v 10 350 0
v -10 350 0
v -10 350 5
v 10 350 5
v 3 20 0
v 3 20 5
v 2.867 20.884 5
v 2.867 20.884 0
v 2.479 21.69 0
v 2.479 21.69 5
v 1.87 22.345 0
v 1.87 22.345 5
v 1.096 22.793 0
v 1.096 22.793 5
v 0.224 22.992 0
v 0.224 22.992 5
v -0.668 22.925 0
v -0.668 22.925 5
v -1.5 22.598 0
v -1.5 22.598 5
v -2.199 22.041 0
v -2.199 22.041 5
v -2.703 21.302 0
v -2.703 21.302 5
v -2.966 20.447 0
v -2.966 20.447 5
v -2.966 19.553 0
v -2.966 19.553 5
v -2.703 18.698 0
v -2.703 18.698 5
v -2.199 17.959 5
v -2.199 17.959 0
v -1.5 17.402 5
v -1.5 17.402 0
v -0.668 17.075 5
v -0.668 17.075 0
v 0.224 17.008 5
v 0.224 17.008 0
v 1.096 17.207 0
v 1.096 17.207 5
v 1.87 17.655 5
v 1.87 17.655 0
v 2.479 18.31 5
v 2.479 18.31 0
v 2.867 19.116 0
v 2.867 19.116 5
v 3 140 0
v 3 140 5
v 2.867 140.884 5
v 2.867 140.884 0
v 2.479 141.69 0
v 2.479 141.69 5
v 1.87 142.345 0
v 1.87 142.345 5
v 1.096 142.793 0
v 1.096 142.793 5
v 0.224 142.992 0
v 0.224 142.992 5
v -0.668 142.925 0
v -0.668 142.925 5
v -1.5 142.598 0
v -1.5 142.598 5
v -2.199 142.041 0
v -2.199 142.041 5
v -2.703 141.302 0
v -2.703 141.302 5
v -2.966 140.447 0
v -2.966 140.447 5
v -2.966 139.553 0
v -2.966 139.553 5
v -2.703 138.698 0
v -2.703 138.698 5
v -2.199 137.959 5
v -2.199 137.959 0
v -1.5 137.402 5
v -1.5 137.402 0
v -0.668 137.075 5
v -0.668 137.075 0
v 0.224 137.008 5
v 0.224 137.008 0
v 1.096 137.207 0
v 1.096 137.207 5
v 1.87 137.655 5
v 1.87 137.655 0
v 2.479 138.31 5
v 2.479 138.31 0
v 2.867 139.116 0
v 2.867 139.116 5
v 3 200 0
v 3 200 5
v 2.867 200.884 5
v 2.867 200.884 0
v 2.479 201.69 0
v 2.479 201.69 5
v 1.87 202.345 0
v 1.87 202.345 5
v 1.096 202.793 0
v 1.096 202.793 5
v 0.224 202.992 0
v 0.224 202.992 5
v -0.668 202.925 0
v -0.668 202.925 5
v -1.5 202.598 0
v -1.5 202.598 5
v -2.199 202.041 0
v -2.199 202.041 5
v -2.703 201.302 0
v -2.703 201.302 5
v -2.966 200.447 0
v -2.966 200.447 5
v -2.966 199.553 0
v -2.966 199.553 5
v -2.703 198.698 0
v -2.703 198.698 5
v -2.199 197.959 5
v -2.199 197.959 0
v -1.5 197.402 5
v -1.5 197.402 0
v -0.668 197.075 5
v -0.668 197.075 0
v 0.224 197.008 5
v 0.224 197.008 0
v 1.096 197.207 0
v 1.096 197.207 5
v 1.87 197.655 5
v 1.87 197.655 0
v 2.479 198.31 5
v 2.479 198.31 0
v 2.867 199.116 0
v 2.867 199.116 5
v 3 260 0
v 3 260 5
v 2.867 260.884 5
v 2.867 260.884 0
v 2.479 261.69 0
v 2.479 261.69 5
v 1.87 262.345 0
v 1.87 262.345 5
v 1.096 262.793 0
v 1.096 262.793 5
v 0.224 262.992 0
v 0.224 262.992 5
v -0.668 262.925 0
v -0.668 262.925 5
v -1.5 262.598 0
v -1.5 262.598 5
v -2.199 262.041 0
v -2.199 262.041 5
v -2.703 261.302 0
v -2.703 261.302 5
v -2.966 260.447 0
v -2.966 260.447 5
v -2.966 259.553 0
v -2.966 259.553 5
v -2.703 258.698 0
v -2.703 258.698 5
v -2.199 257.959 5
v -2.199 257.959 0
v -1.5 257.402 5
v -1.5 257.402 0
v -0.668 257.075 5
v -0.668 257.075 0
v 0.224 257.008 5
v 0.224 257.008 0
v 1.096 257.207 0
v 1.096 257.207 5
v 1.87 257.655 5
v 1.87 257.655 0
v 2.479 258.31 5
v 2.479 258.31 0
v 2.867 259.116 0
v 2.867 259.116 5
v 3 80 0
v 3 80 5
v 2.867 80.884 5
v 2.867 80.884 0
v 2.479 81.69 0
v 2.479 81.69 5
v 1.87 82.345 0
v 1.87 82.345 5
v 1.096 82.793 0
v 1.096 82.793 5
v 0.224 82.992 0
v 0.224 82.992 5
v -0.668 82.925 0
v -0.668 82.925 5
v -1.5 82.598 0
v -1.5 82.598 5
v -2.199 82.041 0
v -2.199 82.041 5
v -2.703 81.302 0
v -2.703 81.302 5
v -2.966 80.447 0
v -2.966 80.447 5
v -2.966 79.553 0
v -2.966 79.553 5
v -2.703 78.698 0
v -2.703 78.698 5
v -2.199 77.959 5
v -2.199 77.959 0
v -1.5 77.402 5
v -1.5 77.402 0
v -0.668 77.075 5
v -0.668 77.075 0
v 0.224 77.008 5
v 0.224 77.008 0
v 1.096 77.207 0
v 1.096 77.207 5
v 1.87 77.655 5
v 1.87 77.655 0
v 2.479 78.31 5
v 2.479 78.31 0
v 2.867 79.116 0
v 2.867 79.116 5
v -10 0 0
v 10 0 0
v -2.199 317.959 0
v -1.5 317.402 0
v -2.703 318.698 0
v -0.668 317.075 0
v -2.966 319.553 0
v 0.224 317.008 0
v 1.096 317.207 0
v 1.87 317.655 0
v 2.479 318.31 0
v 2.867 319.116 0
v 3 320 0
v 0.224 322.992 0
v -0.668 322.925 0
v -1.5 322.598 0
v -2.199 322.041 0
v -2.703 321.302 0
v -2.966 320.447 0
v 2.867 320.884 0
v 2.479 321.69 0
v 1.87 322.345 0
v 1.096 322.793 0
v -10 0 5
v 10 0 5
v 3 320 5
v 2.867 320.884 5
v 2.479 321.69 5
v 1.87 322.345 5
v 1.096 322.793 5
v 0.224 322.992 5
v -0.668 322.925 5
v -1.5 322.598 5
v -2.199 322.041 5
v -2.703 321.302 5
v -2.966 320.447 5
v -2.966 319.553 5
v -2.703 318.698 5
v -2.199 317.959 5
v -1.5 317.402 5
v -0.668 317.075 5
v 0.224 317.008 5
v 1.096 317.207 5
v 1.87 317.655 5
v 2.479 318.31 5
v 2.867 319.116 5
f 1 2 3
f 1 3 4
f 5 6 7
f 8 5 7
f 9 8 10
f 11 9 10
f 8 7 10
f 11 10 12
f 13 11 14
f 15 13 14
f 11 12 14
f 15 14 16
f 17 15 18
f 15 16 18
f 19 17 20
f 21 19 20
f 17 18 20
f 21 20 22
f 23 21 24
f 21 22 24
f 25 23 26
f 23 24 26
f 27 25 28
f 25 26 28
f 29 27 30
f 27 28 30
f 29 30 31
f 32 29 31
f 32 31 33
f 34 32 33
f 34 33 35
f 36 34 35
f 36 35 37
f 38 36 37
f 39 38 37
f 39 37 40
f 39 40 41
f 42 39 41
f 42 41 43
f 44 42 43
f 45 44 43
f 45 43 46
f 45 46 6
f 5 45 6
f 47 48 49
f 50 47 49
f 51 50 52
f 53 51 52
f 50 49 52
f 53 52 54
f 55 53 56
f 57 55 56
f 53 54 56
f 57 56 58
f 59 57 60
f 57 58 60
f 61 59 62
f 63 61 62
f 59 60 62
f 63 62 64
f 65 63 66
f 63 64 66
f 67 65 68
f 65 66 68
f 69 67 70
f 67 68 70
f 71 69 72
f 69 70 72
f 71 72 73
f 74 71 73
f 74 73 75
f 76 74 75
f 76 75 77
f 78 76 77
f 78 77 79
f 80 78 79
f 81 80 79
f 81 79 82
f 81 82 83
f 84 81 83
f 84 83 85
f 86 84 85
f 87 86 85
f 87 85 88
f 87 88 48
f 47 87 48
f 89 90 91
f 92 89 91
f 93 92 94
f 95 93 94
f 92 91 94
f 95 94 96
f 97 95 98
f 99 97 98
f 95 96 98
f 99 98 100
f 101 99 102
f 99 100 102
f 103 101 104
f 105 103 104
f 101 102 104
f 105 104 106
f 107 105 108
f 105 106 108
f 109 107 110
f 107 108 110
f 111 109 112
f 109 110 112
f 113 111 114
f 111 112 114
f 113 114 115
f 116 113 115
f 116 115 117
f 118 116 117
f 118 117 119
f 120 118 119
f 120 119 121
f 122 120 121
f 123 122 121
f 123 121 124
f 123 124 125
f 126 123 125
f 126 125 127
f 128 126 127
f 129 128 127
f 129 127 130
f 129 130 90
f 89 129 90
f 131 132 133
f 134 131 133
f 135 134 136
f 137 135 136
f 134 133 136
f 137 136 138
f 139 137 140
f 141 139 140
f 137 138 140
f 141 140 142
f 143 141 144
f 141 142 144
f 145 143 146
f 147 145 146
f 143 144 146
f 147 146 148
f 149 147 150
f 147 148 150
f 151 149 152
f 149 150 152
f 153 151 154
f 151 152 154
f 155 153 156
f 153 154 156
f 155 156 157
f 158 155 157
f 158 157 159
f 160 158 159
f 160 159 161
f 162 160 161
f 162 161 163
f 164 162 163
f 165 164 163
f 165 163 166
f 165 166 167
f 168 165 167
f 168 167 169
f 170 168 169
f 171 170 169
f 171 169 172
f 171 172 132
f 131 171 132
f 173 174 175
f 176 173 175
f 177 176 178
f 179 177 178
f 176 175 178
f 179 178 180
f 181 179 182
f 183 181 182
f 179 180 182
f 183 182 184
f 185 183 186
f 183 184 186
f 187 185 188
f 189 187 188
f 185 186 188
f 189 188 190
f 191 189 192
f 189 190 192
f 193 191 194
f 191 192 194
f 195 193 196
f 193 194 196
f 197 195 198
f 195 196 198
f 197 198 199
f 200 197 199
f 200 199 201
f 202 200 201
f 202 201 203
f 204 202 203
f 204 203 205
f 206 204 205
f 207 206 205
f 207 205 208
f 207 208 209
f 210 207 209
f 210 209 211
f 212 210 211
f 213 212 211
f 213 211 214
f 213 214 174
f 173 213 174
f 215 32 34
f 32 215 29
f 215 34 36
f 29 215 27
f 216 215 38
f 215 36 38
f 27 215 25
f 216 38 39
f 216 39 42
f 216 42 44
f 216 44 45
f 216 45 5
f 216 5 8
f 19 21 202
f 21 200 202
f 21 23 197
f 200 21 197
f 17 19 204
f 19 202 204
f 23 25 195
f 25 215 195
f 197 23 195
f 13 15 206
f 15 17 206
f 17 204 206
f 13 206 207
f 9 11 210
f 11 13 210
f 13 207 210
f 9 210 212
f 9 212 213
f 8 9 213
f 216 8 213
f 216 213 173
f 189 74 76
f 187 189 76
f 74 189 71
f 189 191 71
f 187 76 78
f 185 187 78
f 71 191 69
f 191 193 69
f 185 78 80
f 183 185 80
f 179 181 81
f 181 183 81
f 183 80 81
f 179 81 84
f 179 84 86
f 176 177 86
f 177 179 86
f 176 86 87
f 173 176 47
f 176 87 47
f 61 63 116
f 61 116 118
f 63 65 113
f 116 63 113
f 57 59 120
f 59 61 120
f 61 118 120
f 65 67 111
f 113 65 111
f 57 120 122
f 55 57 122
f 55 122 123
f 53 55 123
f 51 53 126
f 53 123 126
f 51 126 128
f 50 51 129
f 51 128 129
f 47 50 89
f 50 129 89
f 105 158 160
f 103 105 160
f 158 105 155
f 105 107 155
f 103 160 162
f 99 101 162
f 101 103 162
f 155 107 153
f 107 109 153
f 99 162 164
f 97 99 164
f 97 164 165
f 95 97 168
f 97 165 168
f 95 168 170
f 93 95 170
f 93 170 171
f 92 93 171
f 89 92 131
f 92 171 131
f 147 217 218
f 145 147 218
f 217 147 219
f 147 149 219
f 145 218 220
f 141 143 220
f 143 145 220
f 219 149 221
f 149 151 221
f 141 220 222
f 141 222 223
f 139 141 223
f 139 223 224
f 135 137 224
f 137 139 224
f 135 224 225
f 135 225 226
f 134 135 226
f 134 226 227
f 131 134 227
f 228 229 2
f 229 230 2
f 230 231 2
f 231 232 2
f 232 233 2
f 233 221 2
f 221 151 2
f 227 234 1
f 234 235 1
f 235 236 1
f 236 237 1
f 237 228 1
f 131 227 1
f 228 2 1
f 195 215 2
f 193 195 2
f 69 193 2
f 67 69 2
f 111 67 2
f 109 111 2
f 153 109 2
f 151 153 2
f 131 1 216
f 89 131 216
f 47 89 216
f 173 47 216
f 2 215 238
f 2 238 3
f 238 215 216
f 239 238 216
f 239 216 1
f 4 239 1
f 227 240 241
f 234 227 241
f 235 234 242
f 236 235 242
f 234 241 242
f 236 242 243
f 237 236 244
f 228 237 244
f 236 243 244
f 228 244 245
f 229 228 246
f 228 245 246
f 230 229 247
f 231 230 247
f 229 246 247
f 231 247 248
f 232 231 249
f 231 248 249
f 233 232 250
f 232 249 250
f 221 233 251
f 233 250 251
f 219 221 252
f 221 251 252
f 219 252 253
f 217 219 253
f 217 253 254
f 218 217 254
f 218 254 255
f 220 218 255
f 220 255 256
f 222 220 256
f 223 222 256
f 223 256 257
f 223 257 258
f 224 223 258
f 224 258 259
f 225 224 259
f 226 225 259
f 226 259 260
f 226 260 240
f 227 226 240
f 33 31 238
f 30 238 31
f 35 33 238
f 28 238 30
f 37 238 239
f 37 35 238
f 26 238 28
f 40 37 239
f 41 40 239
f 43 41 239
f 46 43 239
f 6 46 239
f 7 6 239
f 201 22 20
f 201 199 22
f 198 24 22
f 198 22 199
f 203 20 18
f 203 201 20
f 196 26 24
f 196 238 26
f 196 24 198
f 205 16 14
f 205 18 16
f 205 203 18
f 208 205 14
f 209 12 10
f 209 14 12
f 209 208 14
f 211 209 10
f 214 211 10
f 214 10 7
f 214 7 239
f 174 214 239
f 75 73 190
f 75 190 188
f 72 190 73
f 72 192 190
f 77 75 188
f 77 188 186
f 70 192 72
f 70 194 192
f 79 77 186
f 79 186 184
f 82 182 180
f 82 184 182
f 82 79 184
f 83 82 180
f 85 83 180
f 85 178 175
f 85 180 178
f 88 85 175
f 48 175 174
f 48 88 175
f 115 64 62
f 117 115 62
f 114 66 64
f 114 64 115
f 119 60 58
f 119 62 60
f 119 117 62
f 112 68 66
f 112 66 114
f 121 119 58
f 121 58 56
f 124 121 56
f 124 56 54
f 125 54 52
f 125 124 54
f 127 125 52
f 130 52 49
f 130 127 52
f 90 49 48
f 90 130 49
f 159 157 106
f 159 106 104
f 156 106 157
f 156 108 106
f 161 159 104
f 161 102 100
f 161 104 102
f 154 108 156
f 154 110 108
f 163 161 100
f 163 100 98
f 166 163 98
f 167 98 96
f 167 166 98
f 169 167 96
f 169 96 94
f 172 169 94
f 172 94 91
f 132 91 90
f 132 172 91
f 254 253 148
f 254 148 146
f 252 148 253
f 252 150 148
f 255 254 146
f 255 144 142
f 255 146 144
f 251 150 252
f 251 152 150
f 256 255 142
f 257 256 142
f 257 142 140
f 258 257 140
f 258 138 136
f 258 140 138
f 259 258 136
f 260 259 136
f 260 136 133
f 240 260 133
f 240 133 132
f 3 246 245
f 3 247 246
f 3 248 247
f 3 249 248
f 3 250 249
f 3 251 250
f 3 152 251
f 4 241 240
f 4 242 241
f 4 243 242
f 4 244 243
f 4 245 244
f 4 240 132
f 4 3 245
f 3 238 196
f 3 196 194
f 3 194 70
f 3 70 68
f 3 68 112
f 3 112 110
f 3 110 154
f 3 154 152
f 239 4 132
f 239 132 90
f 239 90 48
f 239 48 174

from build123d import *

# Parameters (mm, degrees)
SKIZZE1_W                       = 20
SKIZZE1_H                       = 350
AUFSATZ_LINEAR_AUSTRAGEN1_DEPTH = 5
SKIZZE2_R                       = 3
SCHNITT_LINEAR_AUSTRAGEN1_DEPTH = 10
LINEARES_MUSTER1_COUNT          = 6
LINEARES_MUSTER1_PITCH          = 60


with BuildPart() as part:
    # Skizze1 → Aufsatz-Linear austragen1 (new body)
    with BuildSketch(Plane.XY):
        with Locations((0, 175)):
            Rectangle(SKIZZE1_W, SKIZZE1_H)
    extrude(amount=AUFSATZ_LINEAR_AUSTRAGEN1_DEPTH)

    # Skizze2 → Schnitt-Linear austragen1 (cut)
    with BuildSketch(Plane.XY.offset(5)):
        with Locations((0, 20)):
            Circle(SKIZZE2_R)
    schnitt_linear_austragen1 = extrude(amount=-SCHNITT_LINEAR_AUSTRAGEN1_DEPTH, mode=Mode.SUBTRACT)

    # Lineares Muster1: Schnitt-Linear austragen1 ×6
    with Locations(*[(0, i * LINEARES_MUSTER1_PITCH, 0) for i in range(1, LINEARES_MUSTER1_COUNT)]):
        add(schnitt_linear_austragen1, mode=Mode.SUBTRACT)


solid = part.part
